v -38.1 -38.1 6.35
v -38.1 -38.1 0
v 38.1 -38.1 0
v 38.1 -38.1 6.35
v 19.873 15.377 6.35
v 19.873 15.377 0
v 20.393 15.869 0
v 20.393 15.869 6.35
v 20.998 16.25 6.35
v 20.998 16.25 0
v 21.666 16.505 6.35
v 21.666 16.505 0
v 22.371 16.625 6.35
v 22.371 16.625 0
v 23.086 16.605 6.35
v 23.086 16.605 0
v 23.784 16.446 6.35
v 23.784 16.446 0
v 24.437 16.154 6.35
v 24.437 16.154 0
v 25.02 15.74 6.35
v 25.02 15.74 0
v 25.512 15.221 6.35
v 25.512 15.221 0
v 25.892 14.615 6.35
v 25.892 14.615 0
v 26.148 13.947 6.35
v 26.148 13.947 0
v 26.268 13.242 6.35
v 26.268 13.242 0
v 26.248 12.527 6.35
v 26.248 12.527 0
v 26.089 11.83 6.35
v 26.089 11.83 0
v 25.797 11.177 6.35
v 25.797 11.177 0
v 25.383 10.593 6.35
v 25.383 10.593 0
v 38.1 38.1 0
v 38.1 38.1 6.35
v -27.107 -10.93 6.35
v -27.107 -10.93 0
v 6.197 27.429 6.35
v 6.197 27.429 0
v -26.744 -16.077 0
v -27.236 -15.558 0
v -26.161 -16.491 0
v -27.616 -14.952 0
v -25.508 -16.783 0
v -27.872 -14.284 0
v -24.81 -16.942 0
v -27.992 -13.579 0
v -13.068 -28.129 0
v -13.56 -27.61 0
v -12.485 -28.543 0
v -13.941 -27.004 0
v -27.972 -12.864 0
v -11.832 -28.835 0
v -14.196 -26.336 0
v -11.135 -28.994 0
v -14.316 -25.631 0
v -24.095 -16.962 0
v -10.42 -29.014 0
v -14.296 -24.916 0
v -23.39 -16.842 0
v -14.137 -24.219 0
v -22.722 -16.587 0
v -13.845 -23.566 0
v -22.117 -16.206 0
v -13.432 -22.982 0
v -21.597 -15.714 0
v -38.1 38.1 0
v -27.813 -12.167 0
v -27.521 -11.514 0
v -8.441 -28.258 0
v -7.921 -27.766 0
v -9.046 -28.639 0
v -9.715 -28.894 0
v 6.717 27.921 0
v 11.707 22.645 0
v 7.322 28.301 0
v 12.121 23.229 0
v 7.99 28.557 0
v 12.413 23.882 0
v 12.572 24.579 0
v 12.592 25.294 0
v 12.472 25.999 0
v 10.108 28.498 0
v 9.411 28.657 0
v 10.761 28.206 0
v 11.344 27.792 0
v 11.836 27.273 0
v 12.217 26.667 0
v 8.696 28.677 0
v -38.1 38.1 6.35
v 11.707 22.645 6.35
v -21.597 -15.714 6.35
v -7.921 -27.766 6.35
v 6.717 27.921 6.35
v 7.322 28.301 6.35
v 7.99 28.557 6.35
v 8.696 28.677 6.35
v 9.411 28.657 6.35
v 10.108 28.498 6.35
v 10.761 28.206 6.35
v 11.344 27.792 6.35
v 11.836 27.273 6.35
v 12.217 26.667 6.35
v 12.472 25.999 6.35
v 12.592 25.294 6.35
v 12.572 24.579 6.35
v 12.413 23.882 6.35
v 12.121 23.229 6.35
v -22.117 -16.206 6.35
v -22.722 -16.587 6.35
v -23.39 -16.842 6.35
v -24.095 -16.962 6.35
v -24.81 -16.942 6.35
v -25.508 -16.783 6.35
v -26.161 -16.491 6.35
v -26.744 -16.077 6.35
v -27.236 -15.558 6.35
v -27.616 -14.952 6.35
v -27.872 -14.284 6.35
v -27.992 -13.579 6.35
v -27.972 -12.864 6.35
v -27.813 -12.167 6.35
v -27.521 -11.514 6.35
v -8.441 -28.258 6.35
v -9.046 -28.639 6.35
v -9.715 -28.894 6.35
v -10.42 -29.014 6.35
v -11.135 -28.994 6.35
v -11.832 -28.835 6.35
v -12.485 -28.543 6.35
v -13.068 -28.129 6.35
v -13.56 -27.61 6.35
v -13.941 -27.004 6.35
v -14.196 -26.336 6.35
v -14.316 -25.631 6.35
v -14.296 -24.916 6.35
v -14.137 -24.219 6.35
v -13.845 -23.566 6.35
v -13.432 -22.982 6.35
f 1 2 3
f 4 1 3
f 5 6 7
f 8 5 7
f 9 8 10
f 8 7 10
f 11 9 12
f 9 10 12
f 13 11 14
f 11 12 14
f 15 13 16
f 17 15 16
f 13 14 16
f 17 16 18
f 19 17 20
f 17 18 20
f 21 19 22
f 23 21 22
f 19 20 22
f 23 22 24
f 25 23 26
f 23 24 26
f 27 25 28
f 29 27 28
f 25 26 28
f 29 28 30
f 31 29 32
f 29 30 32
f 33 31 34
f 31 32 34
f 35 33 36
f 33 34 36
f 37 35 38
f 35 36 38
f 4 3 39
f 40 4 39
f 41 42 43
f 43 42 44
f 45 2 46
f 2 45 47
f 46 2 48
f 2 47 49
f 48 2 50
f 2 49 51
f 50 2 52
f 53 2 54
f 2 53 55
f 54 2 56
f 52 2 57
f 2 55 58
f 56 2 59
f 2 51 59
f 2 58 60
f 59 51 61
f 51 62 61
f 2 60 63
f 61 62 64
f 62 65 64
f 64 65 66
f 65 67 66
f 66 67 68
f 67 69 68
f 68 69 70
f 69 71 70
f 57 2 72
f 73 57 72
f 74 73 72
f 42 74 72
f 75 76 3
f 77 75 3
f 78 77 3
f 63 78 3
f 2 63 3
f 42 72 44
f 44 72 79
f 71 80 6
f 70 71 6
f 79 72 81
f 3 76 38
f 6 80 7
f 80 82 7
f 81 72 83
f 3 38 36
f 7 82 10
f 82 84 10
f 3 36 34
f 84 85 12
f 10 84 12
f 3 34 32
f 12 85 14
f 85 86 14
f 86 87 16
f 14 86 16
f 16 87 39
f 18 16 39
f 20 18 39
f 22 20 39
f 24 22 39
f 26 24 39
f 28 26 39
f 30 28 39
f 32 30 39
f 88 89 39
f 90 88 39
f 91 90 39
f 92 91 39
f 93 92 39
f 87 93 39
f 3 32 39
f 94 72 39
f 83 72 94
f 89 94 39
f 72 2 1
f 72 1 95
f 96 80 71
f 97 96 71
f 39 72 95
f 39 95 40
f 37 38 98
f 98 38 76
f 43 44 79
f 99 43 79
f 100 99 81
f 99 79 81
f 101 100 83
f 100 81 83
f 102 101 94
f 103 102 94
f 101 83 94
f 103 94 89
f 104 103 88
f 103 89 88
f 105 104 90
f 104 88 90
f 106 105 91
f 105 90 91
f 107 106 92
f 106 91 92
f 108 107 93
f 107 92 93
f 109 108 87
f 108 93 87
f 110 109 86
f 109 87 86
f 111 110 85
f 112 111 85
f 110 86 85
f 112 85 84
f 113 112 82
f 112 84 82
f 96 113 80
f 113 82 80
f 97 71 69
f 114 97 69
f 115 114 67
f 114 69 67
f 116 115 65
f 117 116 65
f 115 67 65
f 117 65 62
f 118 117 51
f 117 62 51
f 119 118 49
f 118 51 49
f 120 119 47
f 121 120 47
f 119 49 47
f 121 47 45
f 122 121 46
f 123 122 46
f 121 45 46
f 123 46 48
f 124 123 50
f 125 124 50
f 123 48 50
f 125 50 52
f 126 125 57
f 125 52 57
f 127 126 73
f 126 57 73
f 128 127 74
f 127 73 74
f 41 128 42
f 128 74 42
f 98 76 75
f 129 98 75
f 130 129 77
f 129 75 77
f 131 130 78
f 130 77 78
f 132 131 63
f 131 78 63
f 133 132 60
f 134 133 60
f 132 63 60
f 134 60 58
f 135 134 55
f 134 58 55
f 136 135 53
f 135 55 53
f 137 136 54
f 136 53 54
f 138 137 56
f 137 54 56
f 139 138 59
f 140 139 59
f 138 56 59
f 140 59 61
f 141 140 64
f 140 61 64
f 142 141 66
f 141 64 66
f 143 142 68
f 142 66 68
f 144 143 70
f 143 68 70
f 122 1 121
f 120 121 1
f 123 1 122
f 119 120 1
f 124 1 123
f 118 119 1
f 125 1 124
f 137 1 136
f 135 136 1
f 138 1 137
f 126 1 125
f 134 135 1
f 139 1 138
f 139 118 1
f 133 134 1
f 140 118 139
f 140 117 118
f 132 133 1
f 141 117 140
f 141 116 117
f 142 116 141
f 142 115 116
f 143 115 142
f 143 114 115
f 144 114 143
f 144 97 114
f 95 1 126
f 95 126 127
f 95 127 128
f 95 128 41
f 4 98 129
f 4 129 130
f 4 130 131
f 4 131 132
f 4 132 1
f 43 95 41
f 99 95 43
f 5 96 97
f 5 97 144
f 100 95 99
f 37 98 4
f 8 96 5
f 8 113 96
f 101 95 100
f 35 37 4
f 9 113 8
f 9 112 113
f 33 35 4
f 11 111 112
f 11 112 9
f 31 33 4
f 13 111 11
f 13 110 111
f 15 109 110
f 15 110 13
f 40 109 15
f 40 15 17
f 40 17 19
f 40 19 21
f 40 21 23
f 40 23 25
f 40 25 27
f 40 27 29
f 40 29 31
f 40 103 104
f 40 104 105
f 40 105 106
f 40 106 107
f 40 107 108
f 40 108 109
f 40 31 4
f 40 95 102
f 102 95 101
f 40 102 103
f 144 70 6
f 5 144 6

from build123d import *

# Parameters (mm, degrees)
F0_W     = 76.2
F0_H     = 76.2
F1_DEPTH = 6.35


with BuildPart() as f1:
    # F0 (on Top) → F1 (new body)
    with BuildSketch(Plane.XY):
        Rectangle(F0_W, F0_H)
        with BuildLine():
            ThreePointArc((-7.921258, -27.766384), (-13.068427, -28.129462), (-13.431505, -22.982294))
            Line((-13.431505, -22.982294), (19.872915, 15.377263))
            ThreePointArc((19.872915, 15.377263), (25.020084, 15.740341), (25.383162, 10.593172))
            Line((25.383162, 10.593172), (-7.921258, -27.766384))
        make_face(mode=Mode.SUBTRACT)
        with BuildLine():
            ThreePointArc((-21.596966, -15.714419), (-26.744134, -16.077497), (-27.107213, -10.930329))
            Line((-27.107213, -10.930329), (6.197208, 27.429228))
            ThreePointArc((6.197208, 27.429228), (11.344377, 27.792306), (11.707455, 22.645137))
            Line((11.707455, 22.645137), (-21.596966, -15.714419))
        make_face(mode=Mode.SUBTRACT)
    extrude(amount=F1_DEPTH)


solid = f1.part
